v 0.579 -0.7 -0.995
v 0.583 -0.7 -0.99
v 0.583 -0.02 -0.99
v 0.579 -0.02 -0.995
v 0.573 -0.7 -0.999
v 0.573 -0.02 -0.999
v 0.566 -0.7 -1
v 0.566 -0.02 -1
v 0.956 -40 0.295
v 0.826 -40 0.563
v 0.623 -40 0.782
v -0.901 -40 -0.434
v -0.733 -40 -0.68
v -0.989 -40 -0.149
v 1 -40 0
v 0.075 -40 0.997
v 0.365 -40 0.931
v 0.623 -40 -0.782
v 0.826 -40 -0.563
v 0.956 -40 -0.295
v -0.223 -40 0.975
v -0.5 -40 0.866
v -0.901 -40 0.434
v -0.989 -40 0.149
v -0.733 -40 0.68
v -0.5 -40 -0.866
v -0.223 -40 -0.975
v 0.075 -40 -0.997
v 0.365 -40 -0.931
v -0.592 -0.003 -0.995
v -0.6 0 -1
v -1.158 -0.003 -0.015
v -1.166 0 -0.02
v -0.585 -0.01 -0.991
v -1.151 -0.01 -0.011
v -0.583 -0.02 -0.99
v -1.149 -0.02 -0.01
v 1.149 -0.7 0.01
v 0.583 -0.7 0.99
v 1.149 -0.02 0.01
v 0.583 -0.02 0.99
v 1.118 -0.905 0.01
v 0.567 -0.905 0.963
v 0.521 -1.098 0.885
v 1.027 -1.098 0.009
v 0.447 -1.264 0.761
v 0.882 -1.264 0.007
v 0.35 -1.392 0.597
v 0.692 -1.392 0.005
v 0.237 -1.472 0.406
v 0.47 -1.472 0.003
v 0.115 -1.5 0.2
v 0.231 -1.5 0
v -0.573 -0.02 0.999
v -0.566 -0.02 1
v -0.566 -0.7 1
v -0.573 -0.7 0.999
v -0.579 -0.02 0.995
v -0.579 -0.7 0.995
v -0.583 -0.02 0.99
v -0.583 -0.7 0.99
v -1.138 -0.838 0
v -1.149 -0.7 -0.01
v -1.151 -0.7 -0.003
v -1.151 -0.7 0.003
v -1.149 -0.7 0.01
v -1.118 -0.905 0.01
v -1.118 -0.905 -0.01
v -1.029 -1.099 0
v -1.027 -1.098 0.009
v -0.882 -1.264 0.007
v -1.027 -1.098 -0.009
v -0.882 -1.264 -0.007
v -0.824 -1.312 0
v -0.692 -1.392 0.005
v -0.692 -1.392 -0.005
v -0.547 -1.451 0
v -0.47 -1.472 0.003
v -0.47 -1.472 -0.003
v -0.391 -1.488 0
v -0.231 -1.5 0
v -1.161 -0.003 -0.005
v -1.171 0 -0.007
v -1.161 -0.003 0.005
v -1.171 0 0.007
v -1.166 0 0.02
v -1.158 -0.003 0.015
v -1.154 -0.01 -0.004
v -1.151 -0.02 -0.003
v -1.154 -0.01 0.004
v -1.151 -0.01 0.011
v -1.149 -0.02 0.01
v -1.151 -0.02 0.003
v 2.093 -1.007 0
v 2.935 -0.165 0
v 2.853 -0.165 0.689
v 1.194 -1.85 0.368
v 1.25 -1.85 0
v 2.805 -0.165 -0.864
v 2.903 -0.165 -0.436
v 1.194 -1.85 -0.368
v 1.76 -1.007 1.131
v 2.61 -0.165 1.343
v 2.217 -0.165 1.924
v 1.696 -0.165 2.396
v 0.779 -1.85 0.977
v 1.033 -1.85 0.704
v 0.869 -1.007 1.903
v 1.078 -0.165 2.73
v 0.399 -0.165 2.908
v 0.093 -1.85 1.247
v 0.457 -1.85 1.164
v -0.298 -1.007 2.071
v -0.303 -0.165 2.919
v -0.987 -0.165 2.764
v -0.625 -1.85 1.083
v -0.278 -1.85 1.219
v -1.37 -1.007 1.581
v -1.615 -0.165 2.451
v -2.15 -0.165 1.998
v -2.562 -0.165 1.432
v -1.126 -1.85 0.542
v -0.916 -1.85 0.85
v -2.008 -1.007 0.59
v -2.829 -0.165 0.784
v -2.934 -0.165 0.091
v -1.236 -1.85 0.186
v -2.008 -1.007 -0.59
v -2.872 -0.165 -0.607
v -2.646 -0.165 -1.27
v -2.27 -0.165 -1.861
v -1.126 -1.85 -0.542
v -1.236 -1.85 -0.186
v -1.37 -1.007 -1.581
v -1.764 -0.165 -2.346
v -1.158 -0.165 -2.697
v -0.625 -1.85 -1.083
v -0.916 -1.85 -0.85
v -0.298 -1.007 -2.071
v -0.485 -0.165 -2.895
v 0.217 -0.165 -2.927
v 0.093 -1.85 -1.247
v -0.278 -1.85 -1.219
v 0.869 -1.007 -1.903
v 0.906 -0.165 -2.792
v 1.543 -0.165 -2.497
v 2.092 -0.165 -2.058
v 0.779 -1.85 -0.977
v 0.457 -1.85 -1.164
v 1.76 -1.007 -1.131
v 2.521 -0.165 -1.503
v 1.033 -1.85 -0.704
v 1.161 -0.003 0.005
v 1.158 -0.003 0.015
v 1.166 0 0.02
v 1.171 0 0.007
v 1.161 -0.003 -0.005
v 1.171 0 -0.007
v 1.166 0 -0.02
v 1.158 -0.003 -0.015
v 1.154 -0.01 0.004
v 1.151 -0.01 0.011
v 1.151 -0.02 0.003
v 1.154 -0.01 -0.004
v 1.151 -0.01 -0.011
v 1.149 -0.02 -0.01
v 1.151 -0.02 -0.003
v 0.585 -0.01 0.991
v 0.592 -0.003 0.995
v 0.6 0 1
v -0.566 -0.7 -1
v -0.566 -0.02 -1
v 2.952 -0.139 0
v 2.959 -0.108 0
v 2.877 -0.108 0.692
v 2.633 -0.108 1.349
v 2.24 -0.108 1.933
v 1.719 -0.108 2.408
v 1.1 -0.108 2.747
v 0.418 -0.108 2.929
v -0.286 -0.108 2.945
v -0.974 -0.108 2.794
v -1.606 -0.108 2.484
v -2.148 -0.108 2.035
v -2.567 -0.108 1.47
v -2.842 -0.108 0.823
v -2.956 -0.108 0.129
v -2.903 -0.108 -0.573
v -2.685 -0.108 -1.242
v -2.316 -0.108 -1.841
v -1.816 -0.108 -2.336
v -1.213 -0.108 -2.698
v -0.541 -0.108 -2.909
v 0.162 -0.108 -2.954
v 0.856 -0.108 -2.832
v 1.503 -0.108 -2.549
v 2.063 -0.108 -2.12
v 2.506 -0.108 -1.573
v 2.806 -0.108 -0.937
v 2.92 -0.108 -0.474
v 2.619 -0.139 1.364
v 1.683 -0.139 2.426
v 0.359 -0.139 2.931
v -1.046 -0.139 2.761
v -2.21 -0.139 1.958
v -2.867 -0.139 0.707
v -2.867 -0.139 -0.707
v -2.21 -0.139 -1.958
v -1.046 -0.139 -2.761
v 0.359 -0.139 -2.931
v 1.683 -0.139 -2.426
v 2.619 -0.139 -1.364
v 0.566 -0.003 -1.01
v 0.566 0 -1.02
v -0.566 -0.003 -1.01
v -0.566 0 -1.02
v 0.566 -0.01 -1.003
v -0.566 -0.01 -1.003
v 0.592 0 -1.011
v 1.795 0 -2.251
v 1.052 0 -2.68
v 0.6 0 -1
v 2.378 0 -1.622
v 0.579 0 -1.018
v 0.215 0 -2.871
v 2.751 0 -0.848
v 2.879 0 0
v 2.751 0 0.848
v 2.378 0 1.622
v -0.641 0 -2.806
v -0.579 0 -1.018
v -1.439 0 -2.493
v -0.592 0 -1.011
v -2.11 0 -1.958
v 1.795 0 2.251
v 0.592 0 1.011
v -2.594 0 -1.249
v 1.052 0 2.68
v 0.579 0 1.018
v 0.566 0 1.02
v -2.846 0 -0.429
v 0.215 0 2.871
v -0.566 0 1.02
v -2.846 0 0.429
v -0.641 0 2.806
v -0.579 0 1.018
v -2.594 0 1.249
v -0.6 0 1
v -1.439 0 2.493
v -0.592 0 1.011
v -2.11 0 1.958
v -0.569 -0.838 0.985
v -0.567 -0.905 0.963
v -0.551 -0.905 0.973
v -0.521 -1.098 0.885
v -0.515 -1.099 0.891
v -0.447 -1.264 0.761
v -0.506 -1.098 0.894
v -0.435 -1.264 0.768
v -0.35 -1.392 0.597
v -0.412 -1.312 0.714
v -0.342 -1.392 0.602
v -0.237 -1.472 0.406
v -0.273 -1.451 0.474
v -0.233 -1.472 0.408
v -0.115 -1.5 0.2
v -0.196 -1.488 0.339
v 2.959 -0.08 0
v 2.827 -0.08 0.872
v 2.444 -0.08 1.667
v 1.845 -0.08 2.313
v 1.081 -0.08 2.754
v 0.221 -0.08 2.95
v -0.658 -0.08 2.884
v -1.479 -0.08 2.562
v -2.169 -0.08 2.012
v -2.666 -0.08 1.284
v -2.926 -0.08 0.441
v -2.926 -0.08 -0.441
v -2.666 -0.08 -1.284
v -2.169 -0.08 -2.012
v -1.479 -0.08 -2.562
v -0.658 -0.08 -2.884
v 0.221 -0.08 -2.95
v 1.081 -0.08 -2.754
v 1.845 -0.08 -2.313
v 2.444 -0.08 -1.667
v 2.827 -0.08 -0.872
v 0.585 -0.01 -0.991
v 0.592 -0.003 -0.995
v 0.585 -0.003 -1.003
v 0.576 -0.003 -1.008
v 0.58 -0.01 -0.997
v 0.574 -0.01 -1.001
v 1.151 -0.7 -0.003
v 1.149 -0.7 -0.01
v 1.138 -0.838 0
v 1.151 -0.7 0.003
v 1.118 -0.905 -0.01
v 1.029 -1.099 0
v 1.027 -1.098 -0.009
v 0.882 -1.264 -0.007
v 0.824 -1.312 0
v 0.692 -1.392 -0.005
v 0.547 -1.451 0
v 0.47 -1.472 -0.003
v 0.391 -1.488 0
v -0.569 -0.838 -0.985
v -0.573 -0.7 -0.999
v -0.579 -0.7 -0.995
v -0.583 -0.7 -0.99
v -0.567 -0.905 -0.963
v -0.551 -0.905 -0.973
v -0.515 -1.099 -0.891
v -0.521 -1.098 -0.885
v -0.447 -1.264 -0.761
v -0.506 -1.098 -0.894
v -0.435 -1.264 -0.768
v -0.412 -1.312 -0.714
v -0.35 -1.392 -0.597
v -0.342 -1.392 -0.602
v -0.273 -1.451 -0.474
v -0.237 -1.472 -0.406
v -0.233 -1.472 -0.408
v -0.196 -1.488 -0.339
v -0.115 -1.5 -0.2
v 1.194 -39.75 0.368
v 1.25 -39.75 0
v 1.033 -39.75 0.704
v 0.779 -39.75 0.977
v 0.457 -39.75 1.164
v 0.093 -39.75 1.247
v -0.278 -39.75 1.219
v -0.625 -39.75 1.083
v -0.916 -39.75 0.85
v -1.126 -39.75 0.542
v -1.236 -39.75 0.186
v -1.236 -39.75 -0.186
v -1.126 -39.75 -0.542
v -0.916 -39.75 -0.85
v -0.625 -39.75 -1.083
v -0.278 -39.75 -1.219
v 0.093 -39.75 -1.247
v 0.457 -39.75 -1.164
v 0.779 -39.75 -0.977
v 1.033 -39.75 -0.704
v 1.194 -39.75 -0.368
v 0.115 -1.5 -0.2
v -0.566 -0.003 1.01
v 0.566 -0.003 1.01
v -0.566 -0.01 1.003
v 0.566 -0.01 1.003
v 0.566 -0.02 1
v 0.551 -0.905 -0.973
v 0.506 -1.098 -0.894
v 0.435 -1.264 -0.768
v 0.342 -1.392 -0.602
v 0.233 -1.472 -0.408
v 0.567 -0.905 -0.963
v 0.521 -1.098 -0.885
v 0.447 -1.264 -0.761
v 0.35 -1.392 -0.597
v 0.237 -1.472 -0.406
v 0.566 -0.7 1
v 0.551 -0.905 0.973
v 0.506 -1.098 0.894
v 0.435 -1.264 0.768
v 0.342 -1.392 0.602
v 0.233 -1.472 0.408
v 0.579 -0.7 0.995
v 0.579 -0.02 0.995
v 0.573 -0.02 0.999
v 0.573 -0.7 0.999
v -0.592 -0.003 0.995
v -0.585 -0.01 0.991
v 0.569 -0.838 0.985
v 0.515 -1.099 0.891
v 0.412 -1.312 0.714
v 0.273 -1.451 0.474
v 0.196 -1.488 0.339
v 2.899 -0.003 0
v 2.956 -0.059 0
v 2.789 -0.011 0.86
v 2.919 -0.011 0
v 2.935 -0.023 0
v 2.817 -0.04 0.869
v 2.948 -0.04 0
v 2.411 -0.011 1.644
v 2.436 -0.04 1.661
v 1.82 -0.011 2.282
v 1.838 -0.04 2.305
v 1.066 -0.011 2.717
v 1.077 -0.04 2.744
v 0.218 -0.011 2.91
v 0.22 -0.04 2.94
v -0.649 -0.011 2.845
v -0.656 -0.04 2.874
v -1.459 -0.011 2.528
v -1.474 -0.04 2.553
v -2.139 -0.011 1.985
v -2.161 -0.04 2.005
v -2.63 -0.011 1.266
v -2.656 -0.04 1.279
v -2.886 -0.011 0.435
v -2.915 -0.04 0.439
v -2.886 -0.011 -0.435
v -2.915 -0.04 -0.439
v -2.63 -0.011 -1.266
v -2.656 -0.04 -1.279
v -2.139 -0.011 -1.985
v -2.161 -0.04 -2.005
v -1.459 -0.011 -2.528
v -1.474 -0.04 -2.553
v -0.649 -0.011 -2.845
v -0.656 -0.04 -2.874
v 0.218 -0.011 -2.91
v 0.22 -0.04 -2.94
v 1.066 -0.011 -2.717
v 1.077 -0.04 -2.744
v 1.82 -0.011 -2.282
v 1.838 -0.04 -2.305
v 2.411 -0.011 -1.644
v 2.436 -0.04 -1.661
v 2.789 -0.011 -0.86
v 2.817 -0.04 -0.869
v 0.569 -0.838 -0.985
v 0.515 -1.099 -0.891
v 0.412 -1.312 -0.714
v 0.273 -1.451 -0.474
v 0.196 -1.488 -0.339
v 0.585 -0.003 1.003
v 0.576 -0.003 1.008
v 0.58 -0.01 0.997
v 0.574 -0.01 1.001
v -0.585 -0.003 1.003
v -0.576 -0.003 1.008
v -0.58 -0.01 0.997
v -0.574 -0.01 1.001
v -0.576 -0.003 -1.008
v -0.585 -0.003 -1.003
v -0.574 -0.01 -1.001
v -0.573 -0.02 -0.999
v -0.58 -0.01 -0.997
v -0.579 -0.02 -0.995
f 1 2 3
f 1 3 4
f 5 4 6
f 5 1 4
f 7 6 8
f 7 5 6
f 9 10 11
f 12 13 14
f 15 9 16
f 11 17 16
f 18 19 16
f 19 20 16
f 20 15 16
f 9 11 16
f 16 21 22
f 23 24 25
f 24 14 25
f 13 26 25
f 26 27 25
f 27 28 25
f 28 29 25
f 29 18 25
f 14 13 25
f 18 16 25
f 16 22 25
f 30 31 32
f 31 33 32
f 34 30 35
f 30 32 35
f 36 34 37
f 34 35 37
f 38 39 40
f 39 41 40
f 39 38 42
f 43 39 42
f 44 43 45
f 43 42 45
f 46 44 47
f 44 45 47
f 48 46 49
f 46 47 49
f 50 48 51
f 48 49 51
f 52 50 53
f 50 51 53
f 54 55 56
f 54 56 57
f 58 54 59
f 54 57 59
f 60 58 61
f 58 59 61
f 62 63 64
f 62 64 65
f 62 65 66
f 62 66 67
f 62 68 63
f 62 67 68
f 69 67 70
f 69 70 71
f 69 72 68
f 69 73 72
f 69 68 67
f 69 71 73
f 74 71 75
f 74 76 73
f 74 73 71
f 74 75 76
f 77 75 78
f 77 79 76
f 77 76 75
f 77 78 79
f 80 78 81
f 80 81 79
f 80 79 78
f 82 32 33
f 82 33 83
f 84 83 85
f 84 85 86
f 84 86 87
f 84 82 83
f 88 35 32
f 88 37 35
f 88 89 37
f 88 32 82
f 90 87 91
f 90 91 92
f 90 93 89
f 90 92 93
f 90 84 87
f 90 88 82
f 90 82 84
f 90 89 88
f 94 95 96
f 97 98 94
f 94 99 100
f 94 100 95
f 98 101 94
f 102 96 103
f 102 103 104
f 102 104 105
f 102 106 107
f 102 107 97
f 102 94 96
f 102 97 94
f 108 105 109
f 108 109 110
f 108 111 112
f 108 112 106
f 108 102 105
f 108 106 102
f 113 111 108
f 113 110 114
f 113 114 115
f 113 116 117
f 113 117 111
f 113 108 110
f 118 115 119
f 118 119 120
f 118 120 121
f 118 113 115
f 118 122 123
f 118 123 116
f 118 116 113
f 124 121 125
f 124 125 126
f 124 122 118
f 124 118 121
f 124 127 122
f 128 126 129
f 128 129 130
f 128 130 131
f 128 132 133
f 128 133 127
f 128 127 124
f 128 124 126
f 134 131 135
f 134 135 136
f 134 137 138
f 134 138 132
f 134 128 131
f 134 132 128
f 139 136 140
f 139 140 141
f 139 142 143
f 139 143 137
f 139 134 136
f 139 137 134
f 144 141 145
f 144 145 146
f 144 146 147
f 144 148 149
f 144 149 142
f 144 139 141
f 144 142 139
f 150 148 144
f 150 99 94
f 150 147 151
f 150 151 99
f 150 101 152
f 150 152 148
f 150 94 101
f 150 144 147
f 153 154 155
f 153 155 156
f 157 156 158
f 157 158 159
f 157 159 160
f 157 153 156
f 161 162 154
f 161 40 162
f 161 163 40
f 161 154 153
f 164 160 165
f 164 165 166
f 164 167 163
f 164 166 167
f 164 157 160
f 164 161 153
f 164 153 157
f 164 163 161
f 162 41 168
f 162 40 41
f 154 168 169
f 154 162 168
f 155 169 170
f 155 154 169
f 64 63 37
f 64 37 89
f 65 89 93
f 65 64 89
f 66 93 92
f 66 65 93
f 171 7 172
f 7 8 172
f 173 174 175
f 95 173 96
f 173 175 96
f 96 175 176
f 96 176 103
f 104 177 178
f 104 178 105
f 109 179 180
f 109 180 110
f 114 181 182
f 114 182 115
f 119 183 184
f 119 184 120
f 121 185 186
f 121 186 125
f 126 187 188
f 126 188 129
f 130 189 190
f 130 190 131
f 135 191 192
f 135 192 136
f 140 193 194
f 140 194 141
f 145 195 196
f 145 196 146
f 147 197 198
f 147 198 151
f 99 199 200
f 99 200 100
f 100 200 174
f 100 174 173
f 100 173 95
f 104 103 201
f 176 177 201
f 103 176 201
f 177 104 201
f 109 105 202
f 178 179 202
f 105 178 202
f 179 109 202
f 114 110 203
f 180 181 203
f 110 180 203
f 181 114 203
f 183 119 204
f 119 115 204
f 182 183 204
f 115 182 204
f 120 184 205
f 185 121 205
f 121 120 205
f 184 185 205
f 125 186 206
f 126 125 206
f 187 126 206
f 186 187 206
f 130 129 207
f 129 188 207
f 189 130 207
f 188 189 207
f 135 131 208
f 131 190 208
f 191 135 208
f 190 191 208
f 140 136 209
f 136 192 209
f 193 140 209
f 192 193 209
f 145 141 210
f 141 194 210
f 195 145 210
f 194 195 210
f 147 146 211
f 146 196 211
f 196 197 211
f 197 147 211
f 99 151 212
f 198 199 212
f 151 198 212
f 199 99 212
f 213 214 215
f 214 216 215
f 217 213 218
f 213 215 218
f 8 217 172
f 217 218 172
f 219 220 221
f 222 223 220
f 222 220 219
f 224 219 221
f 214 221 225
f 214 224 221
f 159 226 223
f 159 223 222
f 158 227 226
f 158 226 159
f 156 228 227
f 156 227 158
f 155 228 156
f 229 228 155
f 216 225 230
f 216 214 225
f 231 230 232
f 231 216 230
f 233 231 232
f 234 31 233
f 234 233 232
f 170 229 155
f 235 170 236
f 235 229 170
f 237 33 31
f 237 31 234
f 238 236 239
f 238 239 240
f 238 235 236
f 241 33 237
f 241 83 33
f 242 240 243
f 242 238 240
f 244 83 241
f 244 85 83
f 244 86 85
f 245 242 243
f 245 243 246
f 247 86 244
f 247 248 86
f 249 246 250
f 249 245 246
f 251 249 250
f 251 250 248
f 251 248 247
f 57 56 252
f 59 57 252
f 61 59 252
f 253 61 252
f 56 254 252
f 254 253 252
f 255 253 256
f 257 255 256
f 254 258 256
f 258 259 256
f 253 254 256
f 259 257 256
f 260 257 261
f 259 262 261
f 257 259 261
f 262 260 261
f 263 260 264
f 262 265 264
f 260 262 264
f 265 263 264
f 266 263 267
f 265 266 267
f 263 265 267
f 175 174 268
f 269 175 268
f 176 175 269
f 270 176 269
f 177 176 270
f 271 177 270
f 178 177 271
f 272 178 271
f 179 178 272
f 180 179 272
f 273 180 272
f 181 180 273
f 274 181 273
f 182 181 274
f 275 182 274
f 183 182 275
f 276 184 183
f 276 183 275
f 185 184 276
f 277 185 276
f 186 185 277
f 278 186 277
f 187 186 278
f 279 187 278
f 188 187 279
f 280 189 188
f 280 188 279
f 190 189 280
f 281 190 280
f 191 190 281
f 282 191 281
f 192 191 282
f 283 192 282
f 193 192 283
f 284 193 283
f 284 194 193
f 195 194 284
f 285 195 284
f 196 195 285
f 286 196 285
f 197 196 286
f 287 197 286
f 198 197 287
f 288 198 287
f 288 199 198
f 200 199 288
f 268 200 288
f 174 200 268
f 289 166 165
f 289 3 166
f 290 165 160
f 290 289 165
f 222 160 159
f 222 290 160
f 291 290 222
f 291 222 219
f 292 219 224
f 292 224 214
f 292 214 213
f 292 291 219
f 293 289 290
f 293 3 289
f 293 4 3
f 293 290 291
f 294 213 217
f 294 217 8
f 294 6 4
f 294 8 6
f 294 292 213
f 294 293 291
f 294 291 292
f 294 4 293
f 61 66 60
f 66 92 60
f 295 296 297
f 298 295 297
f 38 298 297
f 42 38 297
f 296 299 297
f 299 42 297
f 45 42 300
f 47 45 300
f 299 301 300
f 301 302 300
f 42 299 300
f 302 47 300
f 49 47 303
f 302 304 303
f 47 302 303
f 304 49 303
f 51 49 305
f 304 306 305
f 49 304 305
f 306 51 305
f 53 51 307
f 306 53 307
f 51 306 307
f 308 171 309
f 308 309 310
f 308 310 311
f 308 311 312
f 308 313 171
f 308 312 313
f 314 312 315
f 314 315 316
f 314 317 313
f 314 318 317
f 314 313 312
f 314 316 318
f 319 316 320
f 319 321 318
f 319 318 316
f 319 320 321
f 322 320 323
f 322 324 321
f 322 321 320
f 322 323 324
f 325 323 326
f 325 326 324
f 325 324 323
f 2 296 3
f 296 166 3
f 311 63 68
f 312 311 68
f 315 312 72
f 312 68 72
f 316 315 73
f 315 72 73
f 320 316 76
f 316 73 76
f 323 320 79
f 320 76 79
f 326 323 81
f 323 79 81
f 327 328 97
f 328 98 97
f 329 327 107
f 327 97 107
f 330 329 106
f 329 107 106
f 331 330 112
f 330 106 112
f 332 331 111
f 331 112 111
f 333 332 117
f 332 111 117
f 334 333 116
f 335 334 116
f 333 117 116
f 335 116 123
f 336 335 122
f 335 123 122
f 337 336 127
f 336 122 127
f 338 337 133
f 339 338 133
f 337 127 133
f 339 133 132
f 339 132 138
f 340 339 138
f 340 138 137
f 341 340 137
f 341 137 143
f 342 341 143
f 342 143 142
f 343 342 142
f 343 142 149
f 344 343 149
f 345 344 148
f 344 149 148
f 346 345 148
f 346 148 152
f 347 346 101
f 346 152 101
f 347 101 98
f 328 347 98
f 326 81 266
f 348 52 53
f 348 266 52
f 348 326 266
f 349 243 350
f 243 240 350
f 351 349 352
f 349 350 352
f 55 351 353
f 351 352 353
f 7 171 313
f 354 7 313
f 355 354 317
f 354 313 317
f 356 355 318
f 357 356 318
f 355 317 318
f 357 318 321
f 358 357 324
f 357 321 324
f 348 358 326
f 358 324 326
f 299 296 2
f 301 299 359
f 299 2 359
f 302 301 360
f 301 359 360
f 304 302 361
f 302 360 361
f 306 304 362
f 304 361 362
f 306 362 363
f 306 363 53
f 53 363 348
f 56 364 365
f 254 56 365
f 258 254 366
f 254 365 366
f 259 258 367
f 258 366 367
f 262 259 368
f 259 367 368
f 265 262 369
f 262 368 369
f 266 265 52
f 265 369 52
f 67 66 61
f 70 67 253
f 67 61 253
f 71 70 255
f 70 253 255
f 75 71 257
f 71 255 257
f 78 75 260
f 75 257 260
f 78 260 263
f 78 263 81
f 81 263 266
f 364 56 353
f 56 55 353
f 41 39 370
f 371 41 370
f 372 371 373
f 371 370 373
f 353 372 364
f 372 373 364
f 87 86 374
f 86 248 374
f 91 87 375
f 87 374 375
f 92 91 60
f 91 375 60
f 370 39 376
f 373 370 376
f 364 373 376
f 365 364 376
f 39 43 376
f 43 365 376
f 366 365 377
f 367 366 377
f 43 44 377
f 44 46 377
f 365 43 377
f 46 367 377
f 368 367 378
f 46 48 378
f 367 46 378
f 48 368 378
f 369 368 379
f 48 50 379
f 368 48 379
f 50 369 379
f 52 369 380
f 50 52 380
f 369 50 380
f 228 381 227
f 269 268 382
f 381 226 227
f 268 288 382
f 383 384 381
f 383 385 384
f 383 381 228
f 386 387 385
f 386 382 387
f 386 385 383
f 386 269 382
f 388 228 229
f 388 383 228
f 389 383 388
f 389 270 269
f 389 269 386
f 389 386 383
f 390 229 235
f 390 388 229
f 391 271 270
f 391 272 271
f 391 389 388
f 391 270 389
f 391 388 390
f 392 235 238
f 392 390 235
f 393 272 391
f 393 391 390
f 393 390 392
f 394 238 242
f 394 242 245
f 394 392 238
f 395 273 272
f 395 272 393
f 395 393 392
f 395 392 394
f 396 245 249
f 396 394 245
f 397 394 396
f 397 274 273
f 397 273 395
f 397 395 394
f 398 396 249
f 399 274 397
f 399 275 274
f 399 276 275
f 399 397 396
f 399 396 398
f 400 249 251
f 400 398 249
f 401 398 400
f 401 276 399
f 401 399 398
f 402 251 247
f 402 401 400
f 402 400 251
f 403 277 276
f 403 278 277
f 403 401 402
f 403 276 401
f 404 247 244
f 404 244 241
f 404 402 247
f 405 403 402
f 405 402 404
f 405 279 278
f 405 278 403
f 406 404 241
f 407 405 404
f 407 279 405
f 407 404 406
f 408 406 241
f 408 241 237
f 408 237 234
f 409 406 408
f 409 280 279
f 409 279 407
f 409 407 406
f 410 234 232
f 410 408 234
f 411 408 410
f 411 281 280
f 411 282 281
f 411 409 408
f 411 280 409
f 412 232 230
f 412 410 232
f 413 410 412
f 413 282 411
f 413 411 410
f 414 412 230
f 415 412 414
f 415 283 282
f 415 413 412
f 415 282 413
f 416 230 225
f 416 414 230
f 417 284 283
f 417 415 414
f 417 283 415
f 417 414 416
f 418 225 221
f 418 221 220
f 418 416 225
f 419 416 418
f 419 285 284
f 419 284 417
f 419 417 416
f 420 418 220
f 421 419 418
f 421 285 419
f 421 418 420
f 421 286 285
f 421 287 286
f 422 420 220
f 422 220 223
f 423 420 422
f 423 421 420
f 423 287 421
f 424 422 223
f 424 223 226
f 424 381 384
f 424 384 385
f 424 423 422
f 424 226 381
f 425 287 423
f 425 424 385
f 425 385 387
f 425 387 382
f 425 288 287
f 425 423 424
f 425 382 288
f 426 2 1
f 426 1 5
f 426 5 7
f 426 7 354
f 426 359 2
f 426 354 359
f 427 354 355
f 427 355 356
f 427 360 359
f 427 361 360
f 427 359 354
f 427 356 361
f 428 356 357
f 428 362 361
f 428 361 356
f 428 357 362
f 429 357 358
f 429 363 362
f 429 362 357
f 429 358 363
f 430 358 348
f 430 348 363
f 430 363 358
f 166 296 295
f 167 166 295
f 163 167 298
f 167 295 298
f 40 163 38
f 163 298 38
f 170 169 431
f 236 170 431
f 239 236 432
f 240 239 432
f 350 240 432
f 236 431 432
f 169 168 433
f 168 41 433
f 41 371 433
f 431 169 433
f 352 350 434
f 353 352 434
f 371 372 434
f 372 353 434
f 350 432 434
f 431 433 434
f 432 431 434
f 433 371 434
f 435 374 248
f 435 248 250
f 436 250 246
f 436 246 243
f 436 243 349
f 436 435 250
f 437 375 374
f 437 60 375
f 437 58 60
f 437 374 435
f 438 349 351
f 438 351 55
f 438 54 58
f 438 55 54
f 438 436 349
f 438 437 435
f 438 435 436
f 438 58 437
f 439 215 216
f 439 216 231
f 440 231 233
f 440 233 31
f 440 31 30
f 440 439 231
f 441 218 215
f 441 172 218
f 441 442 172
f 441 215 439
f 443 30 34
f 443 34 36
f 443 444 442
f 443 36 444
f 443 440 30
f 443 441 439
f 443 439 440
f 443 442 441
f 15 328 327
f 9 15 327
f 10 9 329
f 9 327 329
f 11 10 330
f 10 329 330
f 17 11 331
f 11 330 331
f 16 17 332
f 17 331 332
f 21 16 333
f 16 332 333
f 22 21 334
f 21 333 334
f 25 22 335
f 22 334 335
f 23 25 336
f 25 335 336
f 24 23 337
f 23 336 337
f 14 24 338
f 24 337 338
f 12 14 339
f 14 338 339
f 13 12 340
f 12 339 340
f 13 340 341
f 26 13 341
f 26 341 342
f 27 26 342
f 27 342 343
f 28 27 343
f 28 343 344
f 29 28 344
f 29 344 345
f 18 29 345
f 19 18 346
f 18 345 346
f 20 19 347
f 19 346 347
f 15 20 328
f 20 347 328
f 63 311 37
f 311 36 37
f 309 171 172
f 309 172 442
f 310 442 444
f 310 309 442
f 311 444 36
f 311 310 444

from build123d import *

# Parameters (mm, degrees)
SKETCH8_W          = 1.25
SKETCH8_H          = 40
CHAMFER1_SIZE      = 0.25
CHAMFER2_SIZE2     = 0.2
CHAMFER2_SIZE      = 0.141421
FILLET1_R          = 0.08
CUT_EXTRUDE1_DEPTH = 1.5
FILLET2_R          = 0.8
FILLET5_R          = 0.02


with BuildPart() as part:
    # Sketch8 → Revolve1 (revolve)
    with BuildSketch(Plane.XY):
        with Locations((0.625, -20)):
            Rectangle(SKETCH8_W, SKETCH8_H)
    revolve(axis=Axis((0, 0, 0), (0, -1, 0)))

    # Chamfer1
    chamfer1_edges = [part.edges().sort_by_distance(p)[0] for p in [
        (-1.25, -40, 0),
    ]]
    chamfer(chamfer1_edges, length=CHAMFER1_SIZE)

    # Sketch13 → Revolve2 (revolve)
    with BuildSketch(Plane.XY):
        Polygon((0, 0), (3.1, 0), (0, -3.1), align=None)
    revolve(axis=Axis((0, 0, 0), (0, -1, 0)))

    # Chamfer2
    chamfer2_edges = [part.edges().sort_by_distance(p)[0] for p in [
        (-3.1, 0, 0),
    ]]
    chamfer(chamfer2_edges, length=CHAMFER2_SIZE, length2=CHAMFER2_SIZE2)

    # Fillet1
    fillet1_edges = [part.edges().sort_by_distance(p)[0] for p in [
        (-2.958578, 0, 0),
        (-2.958578, -0.141421, 0),
    ]]
    fillet(fillet1_edges, radius=FILLET1_R)

    # Sketch14 → Cut-Extrude1 (cut)
    with BuildSketch(Plane(origin=(0, 0, 0), x_dir=(1, 0, 0), z_dir=(0, 1, 0))):
        Polygon((1.154701, 0), (0.57735, 1), (-0.57735, 1), (-1.154701, 0), (-0.57735, -1), (0.57735, -1), align=None)
    extrude(amount=-CUT_EXTRUDE1_DEPTH, mode=Mode.SUBTRACT)

    # Fillet2
    fillet2_edges = [part.edges().sort_by_distance(p)[0] for p in [
        (0.866025, -1.5, 0.5),
        (0, -1.5, 1),
        (-0.866025, -1.5, 0.5),
        (-0.866025, -1.5, -0.5),
        (0, -1.5, -1),
        (0.866025, -1.5, -0.5),
    ]]
    fillet(fillet2_edges, radius=FILLET2_R)

    # Fillet5
    fillet5_edges = [part.edges().sort_by_distance(p)[0] for p in [
        (0.866025, 0, 0.5),
        (0.866025, 0, -0.5),
        (0, 0, -1),
        (-0.866025, 0, -0.5),
        (-0.866025, 0, 0.5),
        (0, 0, 1),
        (0.57735, -0.35, 1),
        (-0.57735, -0.35, 1),
        (-1.154701, -0.35, 0),
        (-0.57735, -0.35, -1),
        (0.57735, -0.35, -1),
        (1.154701, -0.35, 0),
        (-0.430209, -1.285507, -0.745143),
        (0.430209, -1.285507, -0.745143),
        (-0.860417, -1.285507, 0),
        (0.860417, -1.285507, 0),
        (-0.430209, -1.285507, 0.745143),
        (0.430209, -1.285507, 0.745143),
    ]]
    fillet(fillet5_edges, radius=FILLET5_R)


solid = part.part
